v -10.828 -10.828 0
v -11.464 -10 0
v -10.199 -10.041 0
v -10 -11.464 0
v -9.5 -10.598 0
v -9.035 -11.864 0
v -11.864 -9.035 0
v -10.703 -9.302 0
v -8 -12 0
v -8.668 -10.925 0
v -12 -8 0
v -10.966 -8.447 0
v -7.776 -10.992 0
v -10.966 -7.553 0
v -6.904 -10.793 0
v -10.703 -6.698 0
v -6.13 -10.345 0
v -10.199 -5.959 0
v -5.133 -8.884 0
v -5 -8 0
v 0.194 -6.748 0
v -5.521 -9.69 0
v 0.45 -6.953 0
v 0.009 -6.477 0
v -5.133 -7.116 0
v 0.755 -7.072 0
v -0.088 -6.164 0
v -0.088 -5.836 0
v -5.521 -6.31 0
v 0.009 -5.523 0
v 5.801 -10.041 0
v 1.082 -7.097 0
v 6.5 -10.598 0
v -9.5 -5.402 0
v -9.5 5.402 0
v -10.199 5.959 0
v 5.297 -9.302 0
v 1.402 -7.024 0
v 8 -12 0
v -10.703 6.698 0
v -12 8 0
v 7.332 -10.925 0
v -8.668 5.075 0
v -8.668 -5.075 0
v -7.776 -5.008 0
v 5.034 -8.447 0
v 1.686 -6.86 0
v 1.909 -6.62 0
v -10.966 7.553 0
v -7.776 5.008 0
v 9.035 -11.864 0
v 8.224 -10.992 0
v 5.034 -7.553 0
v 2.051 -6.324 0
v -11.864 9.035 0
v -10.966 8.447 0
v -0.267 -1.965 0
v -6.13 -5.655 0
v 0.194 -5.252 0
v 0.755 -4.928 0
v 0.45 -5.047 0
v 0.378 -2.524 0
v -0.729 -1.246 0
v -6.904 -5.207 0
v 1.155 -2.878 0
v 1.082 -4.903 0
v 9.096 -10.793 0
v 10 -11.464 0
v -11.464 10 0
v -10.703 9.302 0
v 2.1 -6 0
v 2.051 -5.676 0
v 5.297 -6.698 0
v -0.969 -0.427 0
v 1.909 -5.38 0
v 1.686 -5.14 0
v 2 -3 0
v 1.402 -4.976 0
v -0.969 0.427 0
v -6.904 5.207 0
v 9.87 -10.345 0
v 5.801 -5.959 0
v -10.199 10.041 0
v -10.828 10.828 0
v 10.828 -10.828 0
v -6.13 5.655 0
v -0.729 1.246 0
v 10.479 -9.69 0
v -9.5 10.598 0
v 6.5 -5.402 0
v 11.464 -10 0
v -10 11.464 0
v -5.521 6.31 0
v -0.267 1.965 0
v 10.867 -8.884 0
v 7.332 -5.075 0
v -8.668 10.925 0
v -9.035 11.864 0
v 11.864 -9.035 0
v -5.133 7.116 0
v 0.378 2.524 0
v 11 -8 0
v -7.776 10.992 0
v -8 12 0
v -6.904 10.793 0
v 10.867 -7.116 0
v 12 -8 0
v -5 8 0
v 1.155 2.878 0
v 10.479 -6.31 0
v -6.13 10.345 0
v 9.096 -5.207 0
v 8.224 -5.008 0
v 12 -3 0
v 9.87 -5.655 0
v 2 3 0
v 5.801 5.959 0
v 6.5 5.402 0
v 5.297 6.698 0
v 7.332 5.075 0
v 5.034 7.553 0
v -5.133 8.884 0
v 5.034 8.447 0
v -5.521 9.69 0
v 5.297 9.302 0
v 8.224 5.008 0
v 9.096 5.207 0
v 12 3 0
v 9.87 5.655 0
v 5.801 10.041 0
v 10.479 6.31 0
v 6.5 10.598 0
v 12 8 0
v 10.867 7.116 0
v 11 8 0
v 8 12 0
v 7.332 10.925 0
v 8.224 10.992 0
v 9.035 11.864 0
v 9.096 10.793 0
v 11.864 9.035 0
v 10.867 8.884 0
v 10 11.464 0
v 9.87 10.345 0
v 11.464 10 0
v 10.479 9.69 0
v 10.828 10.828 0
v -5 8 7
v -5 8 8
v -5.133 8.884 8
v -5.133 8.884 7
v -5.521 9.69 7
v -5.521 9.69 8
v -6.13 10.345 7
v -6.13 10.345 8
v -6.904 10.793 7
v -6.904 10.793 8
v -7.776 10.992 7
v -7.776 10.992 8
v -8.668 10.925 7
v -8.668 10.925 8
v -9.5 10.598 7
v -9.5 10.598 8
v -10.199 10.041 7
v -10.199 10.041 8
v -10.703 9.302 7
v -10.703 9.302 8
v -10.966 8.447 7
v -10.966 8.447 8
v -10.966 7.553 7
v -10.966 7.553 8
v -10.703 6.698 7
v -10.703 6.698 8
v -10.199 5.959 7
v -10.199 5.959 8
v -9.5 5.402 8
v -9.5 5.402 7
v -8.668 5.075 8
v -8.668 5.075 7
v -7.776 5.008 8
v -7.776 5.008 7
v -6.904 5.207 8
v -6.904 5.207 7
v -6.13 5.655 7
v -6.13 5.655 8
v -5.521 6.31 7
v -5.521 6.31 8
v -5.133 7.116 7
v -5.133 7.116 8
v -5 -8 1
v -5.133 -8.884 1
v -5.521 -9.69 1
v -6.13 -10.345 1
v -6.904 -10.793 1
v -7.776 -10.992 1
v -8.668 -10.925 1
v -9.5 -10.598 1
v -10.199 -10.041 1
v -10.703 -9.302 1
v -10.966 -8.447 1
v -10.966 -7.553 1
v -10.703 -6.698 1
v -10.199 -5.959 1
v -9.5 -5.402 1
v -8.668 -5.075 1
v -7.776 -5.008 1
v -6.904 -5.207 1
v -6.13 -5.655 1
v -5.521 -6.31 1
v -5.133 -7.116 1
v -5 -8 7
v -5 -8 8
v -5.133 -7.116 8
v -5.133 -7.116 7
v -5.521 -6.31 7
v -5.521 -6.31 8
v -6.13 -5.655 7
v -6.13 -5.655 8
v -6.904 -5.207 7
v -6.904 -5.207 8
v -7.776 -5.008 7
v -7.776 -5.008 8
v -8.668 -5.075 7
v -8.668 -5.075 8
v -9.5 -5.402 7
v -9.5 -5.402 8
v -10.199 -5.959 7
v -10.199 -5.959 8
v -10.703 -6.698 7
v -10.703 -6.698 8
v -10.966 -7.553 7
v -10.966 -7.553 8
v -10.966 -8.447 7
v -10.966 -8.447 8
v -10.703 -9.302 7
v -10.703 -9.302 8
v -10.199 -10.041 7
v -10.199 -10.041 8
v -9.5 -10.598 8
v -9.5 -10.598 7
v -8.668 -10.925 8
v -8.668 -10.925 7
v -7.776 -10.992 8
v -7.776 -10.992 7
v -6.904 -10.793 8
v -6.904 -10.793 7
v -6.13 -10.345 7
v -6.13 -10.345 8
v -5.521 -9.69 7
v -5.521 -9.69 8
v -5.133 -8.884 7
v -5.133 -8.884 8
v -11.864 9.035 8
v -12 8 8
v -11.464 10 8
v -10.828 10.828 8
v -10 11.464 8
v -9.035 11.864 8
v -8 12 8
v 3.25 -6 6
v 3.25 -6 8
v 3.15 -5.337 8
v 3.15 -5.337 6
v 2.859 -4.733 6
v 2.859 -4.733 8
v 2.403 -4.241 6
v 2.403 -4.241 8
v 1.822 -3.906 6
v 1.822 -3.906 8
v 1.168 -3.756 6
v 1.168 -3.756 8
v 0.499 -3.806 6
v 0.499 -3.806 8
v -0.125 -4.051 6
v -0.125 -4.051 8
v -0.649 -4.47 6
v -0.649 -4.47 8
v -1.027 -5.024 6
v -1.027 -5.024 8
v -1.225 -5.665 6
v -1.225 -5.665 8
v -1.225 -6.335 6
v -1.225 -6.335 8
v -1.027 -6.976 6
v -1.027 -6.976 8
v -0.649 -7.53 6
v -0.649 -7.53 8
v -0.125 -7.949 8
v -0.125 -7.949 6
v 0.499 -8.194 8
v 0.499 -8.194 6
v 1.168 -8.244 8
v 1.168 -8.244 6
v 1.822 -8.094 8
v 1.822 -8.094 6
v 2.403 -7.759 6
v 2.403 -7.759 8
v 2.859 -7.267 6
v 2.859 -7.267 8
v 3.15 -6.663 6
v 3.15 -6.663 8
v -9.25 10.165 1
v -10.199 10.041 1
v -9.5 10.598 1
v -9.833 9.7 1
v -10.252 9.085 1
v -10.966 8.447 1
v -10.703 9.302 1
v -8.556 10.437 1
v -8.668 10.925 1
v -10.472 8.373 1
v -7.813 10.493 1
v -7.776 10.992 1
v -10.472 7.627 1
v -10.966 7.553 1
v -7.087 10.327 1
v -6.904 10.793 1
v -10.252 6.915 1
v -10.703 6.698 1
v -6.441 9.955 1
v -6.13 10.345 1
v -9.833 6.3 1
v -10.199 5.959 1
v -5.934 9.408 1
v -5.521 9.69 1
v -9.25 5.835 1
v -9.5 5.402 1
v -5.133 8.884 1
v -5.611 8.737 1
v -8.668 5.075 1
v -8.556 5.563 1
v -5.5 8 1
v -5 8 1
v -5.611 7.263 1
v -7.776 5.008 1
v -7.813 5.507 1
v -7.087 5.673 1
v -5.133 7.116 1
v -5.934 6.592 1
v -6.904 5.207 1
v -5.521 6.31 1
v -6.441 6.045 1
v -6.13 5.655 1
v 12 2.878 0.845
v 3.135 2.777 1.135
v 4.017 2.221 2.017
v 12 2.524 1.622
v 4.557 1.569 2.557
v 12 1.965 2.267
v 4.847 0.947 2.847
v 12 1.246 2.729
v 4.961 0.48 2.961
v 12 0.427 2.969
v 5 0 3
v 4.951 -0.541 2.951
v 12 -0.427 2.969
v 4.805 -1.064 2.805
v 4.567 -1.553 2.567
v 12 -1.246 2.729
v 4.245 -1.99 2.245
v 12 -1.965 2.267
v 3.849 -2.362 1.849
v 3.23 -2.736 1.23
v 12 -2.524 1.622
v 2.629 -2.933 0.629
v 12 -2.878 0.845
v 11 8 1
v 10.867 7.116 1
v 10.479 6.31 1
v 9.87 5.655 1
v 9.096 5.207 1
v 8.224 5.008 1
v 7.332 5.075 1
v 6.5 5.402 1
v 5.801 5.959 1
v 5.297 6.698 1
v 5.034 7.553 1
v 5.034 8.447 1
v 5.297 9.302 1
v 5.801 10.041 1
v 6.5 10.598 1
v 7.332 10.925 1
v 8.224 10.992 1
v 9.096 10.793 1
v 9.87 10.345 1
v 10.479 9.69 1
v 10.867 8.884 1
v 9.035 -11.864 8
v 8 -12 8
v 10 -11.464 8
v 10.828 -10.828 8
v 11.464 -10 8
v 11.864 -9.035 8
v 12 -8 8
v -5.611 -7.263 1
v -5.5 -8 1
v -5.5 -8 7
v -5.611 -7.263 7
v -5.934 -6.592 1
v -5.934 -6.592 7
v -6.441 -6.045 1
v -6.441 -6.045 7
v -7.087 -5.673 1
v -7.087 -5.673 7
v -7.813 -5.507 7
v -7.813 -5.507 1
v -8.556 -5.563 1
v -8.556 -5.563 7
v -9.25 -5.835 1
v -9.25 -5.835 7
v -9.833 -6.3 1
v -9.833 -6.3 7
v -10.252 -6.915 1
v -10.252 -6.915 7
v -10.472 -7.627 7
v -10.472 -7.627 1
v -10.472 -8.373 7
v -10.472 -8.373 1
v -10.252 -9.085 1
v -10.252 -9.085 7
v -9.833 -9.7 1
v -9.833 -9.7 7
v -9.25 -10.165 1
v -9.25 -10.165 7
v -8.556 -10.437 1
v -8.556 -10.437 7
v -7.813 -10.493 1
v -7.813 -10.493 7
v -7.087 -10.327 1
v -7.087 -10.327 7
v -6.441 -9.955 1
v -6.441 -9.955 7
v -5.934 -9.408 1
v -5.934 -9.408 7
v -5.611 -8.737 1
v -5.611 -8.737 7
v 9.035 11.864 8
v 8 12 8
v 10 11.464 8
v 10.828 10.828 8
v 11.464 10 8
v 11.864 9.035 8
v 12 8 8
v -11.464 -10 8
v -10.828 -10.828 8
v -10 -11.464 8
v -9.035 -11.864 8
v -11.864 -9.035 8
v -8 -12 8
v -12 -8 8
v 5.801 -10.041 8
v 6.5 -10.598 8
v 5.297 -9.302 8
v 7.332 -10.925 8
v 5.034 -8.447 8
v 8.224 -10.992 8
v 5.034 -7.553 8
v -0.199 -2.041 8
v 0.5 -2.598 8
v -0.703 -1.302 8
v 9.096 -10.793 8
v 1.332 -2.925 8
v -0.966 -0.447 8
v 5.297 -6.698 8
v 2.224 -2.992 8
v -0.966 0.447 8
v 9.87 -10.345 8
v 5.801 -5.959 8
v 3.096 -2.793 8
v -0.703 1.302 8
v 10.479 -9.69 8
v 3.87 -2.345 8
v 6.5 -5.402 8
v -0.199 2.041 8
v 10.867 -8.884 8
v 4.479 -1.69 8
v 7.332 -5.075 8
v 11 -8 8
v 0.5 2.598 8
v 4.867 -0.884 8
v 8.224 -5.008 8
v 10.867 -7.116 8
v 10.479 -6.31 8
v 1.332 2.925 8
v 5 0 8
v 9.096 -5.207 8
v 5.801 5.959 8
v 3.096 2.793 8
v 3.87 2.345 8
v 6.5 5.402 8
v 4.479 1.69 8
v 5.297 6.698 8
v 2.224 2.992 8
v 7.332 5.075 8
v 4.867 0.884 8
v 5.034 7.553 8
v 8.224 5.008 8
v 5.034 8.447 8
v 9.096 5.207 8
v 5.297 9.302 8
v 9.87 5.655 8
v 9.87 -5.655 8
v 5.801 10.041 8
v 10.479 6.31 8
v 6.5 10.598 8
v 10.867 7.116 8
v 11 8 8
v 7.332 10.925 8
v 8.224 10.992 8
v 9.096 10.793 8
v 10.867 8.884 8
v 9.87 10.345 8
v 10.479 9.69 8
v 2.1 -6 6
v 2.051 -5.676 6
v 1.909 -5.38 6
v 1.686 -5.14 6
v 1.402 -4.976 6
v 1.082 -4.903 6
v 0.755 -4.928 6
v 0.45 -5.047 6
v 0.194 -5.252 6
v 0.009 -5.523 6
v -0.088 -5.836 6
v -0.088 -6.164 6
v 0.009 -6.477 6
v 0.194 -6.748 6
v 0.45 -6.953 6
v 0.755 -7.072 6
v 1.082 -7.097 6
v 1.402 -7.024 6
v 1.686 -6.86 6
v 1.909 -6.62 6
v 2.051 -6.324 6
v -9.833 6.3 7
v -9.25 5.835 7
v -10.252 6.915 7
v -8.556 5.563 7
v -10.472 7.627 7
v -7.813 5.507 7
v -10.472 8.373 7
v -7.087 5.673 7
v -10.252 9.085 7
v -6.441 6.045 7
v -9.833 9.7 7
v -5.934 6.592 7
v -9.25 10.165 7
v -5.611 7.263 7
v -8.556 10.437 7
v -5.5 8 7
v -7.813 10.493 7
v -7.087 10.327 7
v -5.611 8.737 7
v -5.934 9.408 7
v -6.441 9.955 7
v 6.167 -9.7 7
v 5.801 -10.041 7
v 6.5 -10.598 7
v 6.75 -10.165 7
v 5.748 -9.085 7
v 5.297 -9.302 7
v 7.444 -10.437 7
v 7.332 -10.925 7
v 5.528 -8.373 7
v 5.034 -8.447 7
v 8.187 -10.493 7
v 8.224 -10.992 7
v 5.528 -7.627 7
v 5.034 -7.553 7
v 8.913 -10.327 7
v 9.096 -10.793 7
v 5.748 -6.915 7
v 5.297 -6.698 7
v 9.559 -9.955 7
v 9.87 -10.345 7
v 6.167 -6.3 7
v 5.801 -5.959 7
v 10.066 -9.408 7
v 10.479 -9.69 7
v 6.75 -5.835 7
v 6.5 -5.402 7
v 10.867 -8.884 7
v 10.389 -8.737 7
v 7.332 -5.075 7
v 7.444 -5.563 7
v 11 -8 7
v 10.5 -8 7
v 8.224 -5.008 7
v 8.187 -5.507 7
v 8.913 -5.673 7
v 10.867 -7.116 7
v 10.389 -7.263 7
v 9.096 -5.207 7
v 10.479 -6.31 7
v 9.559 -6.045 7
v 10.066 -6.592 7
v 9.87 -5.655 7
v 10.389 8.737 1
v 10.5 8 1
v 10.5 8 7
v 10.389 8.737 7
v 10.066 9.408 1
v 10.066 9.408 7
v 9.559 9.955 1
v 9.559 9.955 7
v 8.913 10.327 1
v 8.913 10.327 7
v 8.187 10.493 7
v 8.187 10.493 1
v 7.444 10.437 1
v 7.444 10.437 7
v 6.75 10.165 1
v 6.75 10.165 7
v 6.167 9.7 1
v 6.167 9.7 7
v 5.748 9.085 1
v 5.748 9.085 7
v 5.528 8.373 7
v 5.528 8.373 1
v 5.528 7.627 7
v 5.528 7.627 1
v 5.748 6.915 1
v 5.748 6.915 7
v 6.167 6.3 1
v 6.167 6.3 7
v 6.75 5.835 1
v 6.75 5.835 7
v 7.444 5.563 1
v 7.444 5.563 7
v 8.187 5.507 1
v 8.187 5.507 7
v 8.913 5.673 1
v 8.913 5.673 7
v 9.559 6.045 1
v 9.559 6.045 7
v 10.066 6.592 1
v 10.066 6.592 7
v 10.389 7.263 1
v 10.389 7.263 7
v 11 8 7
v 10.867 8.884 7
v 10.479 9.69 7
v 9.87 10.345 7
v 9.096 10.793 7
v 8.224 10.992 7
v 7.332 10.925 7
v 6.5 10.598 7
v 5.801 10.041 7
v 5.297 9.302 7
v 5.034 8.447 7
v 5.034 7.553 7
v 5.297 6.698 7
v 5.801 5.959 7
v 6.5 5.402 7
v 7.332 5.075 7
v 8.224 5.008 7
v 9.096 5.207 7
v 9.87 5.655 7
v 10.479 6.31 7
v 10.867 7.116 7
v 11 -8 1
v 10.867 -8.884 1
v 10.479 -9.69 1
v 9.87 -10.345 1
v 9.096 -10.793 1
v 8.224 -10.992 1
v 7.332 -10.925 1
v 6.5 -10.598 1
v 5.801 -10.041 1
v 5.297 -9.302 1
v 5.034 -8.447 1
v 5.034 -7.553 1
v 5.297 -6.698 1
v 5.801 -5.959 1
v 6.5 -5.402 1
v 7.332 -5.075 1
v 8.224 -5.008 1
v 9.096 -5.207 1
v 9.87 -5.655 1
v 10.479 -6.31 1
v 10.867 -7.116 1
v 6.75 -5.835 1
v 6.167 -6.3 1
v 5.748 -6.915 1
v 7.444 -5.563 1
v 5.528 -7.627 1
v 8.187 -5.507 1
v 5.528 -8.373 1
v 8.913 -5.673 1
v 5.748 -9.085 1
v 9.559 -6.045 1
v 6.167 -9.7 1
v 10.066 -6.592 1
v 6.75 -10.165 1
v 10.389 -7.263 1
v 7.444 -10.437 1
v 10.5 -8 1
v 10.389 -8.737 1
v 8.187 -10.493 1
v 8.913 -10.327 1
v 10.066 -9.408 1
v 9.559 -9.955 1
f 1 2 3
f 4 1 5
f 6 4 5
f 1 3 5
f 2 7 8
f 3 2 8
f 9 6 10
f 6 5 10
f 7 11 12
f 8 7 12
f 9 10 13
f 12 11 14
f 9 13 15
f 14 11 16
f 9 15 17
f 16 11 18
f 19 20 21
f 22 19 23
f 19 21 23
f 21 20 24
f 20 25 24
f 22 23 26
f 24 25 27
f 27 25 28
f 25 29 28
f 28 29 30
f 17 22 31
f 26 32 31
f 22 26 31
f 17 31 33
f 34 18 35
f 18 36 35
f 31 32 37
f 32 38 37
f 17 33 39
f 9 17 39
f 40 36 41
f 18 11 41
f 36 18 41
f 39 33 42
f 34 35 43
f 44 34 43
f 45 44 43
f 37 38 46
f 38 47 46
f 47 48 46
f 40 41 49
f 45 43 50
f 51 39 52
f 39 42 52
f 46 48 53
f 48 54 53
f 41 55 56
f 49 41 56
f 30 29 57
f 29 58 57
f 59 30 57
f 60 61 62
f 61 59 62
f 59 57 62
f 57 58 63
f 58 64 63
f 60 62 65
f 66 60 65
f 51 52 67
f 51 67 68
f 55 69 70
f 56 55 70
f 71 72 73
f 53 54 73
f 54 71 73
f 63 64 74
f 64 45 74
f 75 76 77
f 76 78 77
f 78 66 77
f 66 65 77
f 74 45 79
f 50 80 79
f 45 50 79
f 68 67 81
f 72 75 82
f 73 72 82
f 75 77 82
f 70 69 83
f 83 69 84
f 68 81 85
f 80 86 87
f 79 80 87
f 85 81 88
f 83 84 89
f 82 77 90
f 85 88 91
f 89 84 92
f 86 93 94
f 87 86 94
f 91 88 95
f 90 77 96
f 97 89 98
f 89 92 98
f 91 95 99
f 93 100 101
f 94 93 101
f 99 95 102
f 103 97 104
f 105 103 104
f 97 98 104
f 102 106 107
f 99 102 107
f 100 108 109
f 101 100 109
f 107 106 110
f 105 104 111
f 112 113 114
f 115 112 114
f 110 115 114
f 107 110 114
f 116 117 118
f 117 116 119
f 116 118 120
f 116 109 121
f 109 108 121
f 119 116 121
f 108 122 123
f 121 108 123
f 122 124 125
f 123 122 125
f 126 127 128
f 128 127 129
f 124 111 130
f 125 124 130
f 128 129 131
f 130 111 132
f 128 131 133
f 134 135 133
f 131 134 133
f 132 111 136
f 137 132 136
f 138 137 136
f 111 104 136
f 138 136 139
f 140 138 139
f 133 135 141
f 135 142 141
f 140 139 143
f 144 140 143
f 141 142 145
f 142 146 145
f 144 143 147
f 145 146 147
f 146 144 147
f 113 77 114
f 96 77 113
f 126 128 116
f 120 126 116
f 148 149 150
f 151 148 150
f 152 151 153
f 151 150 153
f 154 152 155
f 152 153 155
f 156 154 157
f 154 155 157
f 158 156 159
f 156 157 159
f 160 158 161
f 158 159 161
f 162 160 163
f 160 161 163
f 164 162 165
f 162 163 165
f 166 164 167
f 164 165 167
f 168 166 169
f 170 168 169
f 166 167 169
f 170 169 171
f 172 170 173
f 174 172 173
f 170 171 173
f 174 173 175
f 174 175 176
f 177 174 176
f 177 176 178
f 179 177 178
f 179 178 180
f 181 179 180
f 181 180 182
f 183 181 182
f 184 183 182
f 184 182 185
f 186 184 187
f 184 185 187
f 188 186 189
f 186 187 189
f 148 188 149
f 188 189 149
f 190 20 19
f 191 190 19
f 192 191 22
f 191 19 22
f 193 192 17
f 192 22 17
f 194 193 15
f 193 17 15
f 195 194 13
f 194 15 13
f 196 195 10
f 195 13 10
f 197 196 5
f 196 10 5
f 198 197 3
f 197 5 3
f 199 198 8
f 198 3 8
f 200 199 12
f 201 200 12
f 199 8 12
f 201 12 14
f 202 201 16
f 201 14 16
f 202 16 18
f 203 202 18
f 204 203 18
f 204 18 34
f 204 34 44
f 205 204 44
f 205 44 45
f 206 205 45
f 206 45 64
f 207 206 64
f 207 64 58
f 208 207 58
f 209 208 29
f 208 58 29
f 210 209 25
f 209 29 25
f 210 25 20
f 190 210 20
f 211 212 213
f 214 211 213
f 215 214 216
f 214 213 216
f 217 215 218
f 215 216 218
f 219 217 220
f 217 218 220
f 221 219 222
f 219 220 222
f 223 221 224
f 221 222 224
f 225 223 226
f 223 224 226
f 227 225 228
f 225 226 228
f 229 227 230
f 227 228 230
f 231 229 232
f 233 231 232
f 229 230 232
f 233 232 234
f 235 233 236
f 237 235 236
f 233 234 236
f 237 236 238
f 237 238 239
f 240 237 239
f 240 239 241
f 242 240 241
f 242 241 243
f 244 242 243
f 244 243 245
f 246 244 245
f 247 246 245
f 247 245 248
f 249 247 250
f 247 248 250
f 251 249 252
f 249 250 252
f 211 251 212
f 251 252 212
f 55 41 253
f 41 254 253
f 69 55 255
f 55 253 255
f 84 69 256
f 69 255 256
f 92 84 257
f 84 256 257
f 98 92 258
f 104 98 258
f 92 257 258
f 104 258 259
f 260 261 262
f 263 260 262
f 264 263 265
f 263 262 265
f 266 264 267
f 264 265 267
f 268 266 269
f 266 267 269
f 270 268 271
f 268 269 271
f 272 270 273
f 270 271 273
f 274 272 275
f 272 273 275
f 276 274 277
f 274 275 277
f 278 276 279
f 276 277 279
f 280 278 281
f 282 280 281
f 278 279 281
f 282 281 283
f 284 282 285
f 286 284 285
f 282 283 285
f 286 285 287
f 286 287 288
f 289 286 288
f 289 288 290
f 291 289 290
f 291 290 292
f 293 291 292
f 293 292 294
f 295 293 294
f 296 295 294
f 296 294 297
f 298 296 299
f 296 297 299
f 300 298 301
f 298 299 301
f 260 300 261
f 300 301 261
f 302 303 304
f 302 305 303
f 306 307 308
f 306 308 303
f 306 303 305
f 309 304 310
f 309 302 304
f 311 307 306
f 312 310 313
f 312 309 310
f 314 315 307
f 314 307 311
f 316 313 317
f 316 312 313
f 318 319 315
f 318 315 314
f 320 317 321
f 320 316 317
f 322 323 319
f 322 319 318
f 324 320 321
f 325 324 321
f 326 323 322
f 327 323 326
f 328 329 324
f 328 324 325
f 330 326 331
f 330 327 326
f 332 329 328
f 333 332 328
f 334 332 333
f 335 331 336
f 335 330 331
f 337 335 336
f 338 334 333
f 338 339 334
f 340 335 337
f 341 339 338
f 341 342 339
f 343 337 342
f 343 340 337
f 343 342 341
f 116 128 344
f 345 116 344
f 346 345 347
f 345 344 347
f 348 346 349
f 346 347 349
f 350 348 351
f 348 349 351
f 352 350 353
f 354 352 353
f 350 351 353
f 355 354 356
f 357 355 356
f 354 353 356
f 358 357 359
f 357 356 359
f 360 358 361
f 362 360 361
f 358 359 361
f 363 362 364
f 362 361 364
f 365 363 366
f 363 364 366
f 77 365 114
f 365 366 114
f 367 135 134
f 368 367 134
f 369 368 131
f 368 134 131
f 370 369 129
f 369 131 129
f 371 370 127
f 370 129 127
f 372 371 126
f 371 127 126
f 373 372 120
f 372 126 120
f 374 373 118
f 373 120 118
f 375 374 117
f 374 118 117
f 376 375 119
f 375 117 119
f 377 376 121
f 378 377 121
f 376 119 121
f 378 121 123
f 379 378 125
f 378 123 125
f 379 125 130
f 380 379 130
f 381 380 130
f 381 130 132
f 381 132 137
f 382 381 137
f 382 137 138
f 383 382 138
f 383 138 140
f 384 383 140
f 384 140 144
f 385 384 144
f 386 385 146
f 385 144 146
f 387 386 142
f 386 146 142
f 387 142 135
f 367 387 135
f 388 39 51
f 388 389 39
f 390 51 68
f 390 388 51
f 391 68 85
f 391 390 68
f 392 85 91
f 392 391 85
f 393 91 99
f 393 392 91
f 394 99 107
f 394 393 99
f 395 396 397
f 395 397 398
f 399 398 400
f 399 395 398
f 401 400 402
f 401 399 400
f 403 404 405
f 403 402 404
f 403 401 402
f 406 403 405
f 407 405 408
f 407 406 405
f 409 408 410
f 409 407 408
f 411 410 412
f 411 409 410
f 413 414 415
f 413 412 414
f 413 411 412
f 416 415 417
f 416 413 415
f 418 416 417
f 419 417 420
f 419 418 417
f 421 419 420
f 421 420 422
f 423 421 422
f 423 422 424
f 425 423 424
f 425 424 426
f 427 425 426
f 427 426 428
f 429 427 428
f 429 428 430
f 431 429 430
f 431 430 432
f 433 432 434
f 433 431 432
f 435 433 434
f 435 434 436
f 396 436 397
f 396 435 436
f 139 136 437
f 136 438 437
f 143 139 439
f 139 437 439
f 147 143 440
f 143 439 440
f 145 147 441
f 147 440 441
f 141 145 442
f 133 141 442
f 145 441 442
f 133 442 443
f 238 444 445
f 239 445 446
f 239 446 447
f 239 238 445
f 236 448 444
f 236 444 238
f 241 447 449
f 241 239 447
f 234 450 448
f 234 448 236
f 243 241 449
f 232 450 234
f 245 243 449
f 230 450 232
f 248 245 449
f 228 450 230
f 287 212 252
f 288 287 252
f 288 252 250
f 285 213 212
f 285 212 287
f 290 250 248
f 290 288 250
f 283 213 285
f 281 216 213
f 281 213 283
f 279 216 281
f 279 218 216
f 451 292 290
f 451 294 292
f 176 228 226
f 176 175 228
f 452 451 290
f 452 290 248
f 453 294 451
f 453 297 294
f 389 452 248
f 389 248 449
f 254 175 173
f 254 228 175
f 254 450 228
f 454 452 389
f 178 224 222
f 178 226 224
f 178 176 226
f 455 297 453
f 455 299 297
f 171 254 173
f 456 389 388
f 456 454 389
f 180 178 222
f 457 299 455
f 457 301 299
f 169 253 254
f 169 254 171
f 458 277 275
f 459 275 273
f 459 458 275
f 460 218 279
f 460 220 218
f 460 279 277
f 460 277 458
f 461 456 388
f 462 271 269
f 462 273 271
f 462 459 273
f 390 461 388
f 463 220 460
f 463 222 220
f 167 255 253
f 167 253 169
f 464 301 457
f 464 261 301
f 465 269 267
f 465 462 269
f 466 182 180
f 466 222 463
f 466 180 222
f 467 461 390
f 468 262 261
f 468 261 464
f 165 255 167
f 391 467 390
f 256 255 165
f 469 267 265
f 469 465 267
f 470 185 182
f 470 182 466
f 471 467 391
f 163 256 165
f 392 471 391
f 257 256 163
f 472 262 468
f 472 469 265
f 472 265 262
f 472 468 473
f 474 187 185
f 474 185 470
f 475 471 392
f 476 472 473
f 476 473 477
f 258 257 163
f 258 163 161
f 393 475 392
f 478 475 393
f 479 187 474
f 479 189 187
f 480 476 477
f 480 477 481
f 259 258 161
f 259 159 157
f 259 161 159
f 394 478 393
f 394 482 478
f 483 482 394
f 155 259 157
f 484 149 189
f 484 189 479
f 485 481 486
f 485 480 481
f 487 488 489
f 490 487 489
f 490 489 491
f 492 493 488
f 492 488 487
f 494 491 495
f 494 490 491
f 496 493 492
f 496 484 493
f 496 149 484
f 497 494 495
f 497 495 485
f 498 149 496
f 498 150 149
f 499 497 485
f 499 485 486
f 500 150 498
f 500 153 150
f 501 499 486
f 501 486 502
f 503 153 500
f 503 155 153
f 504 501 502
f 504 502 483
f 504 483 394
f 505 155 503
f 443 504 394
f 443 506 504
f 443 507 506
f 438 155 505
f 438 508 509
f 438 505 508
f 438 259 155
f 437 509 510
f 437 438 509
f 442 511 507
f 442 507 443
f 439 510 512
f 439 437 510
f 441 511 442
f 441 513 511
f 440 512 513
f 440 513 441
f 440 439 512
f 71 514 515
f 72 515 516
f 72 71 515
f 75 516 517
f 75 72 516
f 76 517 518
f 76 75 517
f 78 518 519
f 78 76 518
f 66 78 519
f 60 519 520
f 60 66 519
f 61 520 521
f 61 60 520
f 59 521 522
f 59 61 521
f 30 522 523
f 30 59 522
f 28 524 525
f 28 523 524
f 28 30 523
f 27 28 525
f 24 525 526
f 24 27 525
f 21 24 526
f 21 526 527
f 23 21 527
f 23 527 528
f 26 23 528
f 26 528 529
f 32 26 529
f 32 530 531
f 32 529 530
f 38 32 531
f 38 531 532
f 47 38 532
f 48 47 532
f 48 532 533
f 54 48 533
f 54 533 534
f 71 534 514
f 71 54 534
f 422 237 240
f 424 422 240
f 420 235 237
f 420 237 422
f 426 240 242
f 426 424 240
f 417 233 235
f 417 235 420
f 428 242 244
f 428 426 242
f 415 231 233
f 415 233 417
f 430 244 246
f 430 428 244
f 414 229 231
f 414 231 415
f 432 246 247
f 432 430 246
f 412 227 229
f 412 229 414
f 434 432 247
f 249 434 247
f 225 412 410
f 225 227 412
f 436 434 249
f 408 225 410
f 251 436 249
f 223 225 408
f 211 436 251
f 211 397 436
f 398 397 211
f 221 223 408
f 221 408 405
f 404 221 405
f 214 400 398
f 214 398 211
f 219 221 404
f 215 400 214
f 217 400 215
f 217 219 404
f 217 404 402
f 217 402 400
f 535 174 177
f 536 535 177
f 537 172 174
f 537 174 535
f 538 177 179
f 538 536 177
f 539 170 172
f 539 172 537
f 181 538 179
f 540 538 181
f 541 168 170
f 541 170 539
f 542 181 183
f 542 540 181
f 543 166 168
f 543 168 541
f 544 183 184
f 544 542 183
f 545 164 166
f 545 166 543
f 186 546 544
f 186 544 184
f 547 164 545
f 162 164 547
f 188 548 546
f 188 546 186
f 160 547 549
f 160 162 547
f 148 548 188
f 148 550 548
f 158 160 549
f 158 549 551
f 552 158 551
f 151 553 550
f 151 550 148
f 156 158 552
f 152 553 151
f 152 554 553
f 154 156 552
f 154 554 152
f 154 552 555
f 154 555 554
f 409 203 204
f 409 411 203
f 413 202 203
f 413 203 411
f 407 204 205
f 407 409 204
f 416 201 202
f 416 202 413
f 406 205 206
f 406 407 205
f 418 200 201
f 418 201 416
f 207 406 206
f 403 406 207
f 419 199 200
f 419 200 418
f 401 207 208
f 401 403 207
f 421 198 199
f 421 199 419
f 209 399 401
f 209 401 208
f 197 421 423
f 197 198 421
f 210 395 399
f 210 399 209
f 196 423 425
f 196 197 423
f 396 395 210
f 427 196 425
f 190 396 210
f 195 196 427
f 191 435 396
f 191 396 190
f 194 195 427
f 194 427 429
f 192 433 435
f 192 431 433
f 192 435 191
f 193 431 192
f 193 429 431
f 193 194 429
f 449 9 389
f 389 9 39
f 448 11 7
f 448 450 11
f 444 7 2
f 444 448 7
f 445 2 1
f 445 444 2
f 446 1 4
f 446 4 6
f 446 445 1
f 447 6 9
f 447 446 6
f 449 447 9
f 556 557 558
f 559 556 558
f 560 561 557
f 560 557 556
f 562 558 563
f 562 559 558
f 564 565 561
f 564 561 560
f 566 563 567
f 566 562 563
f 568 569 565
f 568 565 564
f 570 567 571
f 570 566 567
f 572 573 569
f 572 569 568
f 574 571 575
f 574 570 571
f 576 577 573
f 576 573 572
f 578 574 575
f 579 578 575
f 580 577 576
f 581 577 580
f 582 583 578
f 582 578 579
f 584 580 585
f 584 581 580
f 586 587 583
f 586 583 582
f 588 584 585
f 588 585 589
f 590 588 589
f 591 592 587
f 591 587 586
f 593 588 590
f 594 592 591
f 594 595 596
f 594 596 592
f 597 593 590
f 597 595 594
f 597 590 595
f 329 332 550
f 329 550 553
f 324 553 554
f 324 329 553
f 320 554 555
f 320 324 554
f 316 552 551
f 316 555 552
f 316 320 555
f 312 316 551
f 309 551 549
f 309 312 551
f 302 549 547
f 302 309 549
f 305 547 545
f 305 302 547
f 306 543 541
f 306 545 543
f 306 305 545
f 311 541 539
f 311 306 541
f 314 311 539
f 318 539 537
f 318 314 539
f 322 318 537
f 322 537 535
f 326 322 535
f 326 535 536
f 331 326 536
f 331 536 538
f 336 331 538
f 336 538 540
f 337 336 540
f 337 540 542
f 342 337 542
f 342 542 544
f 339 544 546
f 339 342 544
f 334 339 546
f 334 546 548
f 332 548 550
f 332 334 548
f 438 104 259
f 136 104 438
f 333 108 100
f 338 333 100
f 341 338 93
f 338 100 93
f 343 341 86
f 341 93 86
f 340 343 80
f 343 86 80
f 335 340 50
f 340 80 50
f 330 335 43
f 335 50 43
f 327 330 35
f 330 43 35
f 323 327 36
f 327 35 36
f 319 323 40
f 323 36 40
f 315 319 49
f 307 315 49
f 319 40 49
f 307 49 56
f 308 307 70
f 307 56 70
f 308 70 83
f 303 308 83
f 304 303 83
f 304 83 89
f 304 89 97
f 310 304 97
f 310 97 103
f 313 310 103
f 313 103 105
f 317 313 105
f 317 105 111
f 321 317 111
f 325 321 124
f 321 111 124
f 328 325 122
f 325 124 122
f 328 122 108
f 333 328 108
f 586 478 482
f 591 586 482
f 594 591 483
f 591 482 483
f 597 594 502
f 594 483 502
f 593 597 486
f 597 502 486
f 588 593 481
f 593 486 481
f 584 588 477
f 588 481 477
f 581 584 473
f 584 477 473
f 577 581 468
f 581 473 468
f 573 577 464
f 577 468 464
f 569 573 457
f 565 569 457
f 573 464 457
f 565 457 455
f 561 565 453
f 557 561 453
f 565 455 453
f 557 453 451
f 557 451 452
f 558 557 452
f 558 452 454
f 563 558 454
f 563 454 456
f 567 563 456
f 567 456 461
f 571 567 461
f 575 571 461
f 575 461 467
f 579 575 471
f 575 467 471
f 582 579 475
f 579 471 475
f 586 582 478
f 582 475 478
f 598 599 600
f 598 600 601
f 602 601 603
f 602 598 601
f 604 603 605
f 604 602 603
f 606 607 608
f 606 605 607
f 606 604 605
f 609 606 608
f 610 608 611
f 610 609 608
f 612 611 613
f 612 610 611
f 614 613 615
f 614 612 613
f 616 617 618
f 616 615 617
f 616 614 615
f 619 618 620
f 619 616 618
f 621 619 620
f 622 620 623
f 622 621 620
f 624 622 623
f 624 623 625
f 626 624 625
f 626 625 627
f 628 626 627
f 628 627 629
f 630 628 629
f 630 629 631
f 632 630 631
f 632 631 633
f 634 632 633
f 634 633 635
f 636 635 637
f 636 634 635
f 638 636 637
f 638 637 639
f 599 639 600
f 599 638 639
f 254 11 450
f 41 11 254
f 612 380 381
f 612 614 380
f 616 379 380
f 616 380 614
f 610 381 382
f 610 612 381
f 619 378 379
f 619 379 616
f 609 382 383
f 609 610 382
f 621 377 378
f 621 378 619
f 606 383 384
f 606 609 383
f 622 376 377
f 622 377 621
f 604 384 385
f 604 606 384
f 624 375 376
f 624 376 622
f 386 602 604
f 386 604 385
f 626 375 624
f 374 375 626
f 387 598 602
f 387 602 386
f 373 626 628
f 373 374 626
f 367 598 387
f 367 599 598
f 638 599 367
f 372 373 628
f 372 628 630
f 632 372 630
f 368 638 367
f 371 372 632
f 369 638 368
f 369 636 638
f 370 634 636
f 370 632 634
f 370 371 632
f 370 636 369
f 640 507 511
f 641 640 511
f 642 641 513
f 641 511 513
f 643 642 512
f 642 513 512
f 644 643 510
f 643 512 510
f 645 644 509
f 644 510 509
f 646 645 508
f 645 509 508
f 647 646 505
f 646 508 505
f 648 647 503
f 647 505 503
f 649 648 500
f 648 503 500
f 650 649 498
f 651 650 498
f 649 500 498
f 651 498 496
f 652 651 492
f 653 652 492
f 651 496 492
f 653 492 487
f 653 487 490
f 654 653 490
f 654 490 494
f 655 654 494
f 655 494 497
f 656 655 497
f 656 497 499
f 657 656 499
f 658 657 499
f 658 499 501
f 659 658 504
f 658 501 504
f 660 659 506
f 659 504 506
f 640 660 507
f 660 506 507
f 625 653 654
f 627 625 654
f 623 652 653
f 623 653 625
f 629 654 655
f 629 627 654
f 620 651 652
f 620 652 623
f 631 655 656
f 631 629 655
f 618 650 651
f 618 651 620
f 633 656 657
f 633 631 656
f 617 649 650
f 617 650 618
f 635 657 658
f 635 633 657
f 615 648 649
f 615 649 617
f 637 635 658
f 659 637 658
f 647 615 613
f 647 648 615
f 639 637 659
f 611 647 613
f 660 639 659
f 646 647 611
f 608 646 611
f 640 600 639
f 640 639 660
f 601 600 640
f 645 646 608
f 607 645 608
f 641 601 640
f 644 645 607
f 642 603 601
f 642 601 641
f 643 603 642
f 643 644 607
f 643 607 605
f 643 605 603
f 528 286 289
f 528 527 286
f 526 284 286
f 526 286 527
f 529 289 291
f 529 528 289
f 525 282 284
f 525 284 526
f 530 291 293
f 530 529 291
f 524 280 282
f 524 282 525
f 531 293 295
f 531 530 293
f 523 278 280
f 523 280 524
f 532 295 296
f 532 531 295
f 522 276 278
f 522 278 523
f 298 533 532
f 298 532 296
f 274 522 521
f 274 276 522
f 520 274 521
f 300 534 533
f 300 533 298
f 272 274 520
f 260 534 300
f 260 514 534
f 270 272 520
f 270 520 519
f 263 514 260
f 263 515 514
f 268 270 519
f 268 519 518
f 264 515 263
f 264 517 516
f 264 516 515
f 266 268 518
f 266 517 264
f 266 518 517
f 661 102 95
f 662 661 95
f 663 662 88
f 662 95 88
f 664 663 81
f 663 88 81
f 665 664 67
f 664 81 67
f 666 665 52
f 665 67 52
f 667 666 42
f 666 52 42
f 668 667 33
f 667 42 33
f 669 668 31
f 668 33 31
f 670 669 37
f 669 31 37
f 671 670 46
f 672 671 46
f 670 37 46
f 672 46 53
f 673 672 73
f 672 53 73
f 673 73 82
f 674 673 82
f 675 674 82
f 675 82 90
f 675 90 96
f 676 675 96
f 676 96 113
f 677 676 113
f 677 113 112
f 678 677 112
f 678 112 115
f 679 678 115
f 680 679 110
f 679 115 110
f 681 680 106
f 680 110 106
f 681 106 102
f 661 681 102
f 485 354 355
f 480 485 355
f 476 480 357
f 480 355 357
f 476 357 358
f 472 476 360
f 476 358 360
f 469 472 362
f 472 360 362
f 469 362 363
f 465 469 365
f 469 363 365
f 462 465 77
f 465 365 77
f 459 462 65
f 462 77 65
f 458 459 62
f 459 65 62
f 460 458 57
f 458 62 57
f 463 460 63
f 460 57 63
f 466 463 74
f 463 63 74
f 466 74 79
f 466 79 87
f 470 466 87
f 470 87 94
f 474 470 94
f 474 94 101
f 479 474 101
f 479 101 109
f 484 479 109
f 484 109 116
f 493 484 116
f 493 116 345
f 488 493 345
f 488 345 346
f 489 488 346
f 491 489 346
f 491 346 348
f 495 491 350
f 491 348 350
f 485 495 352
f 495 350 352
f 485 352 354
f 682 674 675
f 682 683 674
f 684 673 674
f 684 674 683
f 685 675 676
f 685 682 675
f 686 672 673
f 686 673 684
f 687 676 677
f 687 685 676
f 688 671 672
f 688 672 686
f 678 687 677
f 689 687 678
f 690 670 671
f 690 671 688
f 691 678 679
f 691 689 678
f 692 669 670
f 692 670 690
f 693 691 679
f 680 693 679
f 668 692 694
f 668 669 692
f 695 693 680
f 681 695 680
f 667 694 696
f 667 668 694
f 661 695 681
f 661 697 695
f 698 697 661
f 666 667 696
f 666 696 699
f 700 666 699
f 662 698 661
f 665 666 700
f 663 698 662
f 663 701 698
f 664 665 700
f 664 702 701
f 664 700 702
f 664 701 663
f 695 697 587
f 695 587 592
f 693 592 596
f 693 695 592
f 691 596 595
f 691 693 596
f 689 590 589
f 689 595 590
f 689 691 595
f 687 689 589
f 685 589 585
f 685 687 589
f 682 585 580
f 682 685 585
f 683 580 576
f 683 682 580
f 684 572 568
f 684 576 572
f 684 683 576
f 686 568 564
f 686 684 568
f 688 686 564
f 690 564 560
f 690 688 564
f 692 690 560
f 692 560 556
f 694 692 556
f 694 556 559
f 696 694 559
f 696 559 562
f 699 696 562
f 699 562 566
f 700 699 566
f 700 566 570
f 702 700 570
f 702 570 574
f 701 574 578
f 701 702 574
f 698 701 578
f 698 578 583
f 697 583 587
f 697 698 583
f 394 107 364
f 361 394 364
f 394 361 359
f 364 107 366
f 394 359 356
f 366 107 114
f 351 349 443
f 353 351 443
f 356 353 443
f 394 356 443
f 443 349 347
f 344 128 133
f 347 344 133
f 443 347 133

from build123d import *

# Parameters (mm, degrees)
SKETCH_W        = 24
SKETCH_H        = 24
SKETCH_R        = 2.5
SKETCH_R_2      = 1.1
PAD_DEPTH       = 8
SKETCH001_R     = 3
POCKET_DEPTH    = 1
SKETCH002_R     = 3
POCKET001_DEPTH = 10
SKETCH003_R     = 3
POCKET002_DEPTH = 8
FILLET_R        = 4
SKETCH004_R     = 2.25
POCKET003_DEPTH = 2
SKETCH005_R     = 3
POCKET004_DEPTH = 1


with BuildPart() as part:
    # Sketch → Pad (new body)
    with BuildSketch(Plane.XY):
        Rectangle(SKETCH_W, SKETCH_H)
        with Locations((-8, 8)):
            Circle(SKETCH_R, mode=Mode.SUBTRACT)
        with Locations((8, 8)):
            Circle(SKETCH_R, mode=Mode.SUBTRACT)
        with Locations((-8, -8)):
            Circle(SKETCH_R, mode=Mode.SUBTRACT)
        with Locations((8, -8)):
            Circle(SKETCH_R, mode=Mode.SUBTRACT)
        with Locations((1, -6)):
            Circle(SKETCH_R_2, mode=Mode.SUBTRACT)
    extrude(amount=PAD_DEPTH)

    # Sketch001 (on Face10 of Pad) → Pocket (cut)
    with BuildSketch(Plane(origin=(0, 0, 0), x_dir=(1, 0, 0), z_dir=(0, 0, -1))):
        with Locations((-8, 8)):
            Circle(SKETCH001_R)
        with Locations((8, 8)):
            Circle(SKETCH001_R)
        with Locations((8, -8)):
            Circle(SKETCH001_R)
        with Locations((-8, -8)):
            Circle(SKETCH001_R)
    extrude(amount=-POCKET_DEPTH, mode=Mode.SUBTRACT)

    # Sketch002 (on Face6 of Pocket) → Pocket001 (cut)
    with BuildSketch(Plane.YZ.offset(12)):
        Circle(SKETCH002_R)
    extrude(amount=-POCKET001_DEPTH, mode=Mode.SUBTRACT)

    # Sketch003 (on Face4 of Pocket001) → Pocket002 (cut)
    with BuildSketch(Plane(origin=(0, 0, 0), x_dir=(1, 0, 0), z_dir=(0, 0, -1))):
        with Locations((2, 0)):
            Circle(SKETCH003_R)
    extrude(amount=-POCKET002_DEPTH, mode=Mode.SUBTRACT)

    # Fillet
    fillet_edges = [part.edges().sort_by_distance(p)[0] for p in [
        (12, 12, 4),
        (12, -12, 4),
        (-12, -12, 4),
        (-12, 12, 4),
    ]]
    fillet(fillet_edges, radius=FILLET_R)

    # Sketch004 (on Face5 of Fillet) → Pocket003 (cut)
    with BuildSketch(Plane.XY.offset(8)):
        with Locations((1, -6)):
            Circle(SKETCH004_R)
    extrude(amount=-POCKET003_DEPTH, mode=Mode.SUBTRACT)

    # Sketch005 (on Face5 of Pocket003) → Pocket004 (cut)
    with BuildSketch(Plane.XY.offset(8)):
        with Locations((8, 8)):
            Circle(SKETCH005_R)
        with Locations((-8, -8)):
            Circle(SKETCH005_R)
        with Locations((8, -8)):
            Circle(SKETCH005_R)
        with Locations((-8, 8)):
            Circle(SKETCH005_R)
    extrude(amount=-POCKET004_DEPTH, mode=Mode.SUBTRACT)


solid = part.part
